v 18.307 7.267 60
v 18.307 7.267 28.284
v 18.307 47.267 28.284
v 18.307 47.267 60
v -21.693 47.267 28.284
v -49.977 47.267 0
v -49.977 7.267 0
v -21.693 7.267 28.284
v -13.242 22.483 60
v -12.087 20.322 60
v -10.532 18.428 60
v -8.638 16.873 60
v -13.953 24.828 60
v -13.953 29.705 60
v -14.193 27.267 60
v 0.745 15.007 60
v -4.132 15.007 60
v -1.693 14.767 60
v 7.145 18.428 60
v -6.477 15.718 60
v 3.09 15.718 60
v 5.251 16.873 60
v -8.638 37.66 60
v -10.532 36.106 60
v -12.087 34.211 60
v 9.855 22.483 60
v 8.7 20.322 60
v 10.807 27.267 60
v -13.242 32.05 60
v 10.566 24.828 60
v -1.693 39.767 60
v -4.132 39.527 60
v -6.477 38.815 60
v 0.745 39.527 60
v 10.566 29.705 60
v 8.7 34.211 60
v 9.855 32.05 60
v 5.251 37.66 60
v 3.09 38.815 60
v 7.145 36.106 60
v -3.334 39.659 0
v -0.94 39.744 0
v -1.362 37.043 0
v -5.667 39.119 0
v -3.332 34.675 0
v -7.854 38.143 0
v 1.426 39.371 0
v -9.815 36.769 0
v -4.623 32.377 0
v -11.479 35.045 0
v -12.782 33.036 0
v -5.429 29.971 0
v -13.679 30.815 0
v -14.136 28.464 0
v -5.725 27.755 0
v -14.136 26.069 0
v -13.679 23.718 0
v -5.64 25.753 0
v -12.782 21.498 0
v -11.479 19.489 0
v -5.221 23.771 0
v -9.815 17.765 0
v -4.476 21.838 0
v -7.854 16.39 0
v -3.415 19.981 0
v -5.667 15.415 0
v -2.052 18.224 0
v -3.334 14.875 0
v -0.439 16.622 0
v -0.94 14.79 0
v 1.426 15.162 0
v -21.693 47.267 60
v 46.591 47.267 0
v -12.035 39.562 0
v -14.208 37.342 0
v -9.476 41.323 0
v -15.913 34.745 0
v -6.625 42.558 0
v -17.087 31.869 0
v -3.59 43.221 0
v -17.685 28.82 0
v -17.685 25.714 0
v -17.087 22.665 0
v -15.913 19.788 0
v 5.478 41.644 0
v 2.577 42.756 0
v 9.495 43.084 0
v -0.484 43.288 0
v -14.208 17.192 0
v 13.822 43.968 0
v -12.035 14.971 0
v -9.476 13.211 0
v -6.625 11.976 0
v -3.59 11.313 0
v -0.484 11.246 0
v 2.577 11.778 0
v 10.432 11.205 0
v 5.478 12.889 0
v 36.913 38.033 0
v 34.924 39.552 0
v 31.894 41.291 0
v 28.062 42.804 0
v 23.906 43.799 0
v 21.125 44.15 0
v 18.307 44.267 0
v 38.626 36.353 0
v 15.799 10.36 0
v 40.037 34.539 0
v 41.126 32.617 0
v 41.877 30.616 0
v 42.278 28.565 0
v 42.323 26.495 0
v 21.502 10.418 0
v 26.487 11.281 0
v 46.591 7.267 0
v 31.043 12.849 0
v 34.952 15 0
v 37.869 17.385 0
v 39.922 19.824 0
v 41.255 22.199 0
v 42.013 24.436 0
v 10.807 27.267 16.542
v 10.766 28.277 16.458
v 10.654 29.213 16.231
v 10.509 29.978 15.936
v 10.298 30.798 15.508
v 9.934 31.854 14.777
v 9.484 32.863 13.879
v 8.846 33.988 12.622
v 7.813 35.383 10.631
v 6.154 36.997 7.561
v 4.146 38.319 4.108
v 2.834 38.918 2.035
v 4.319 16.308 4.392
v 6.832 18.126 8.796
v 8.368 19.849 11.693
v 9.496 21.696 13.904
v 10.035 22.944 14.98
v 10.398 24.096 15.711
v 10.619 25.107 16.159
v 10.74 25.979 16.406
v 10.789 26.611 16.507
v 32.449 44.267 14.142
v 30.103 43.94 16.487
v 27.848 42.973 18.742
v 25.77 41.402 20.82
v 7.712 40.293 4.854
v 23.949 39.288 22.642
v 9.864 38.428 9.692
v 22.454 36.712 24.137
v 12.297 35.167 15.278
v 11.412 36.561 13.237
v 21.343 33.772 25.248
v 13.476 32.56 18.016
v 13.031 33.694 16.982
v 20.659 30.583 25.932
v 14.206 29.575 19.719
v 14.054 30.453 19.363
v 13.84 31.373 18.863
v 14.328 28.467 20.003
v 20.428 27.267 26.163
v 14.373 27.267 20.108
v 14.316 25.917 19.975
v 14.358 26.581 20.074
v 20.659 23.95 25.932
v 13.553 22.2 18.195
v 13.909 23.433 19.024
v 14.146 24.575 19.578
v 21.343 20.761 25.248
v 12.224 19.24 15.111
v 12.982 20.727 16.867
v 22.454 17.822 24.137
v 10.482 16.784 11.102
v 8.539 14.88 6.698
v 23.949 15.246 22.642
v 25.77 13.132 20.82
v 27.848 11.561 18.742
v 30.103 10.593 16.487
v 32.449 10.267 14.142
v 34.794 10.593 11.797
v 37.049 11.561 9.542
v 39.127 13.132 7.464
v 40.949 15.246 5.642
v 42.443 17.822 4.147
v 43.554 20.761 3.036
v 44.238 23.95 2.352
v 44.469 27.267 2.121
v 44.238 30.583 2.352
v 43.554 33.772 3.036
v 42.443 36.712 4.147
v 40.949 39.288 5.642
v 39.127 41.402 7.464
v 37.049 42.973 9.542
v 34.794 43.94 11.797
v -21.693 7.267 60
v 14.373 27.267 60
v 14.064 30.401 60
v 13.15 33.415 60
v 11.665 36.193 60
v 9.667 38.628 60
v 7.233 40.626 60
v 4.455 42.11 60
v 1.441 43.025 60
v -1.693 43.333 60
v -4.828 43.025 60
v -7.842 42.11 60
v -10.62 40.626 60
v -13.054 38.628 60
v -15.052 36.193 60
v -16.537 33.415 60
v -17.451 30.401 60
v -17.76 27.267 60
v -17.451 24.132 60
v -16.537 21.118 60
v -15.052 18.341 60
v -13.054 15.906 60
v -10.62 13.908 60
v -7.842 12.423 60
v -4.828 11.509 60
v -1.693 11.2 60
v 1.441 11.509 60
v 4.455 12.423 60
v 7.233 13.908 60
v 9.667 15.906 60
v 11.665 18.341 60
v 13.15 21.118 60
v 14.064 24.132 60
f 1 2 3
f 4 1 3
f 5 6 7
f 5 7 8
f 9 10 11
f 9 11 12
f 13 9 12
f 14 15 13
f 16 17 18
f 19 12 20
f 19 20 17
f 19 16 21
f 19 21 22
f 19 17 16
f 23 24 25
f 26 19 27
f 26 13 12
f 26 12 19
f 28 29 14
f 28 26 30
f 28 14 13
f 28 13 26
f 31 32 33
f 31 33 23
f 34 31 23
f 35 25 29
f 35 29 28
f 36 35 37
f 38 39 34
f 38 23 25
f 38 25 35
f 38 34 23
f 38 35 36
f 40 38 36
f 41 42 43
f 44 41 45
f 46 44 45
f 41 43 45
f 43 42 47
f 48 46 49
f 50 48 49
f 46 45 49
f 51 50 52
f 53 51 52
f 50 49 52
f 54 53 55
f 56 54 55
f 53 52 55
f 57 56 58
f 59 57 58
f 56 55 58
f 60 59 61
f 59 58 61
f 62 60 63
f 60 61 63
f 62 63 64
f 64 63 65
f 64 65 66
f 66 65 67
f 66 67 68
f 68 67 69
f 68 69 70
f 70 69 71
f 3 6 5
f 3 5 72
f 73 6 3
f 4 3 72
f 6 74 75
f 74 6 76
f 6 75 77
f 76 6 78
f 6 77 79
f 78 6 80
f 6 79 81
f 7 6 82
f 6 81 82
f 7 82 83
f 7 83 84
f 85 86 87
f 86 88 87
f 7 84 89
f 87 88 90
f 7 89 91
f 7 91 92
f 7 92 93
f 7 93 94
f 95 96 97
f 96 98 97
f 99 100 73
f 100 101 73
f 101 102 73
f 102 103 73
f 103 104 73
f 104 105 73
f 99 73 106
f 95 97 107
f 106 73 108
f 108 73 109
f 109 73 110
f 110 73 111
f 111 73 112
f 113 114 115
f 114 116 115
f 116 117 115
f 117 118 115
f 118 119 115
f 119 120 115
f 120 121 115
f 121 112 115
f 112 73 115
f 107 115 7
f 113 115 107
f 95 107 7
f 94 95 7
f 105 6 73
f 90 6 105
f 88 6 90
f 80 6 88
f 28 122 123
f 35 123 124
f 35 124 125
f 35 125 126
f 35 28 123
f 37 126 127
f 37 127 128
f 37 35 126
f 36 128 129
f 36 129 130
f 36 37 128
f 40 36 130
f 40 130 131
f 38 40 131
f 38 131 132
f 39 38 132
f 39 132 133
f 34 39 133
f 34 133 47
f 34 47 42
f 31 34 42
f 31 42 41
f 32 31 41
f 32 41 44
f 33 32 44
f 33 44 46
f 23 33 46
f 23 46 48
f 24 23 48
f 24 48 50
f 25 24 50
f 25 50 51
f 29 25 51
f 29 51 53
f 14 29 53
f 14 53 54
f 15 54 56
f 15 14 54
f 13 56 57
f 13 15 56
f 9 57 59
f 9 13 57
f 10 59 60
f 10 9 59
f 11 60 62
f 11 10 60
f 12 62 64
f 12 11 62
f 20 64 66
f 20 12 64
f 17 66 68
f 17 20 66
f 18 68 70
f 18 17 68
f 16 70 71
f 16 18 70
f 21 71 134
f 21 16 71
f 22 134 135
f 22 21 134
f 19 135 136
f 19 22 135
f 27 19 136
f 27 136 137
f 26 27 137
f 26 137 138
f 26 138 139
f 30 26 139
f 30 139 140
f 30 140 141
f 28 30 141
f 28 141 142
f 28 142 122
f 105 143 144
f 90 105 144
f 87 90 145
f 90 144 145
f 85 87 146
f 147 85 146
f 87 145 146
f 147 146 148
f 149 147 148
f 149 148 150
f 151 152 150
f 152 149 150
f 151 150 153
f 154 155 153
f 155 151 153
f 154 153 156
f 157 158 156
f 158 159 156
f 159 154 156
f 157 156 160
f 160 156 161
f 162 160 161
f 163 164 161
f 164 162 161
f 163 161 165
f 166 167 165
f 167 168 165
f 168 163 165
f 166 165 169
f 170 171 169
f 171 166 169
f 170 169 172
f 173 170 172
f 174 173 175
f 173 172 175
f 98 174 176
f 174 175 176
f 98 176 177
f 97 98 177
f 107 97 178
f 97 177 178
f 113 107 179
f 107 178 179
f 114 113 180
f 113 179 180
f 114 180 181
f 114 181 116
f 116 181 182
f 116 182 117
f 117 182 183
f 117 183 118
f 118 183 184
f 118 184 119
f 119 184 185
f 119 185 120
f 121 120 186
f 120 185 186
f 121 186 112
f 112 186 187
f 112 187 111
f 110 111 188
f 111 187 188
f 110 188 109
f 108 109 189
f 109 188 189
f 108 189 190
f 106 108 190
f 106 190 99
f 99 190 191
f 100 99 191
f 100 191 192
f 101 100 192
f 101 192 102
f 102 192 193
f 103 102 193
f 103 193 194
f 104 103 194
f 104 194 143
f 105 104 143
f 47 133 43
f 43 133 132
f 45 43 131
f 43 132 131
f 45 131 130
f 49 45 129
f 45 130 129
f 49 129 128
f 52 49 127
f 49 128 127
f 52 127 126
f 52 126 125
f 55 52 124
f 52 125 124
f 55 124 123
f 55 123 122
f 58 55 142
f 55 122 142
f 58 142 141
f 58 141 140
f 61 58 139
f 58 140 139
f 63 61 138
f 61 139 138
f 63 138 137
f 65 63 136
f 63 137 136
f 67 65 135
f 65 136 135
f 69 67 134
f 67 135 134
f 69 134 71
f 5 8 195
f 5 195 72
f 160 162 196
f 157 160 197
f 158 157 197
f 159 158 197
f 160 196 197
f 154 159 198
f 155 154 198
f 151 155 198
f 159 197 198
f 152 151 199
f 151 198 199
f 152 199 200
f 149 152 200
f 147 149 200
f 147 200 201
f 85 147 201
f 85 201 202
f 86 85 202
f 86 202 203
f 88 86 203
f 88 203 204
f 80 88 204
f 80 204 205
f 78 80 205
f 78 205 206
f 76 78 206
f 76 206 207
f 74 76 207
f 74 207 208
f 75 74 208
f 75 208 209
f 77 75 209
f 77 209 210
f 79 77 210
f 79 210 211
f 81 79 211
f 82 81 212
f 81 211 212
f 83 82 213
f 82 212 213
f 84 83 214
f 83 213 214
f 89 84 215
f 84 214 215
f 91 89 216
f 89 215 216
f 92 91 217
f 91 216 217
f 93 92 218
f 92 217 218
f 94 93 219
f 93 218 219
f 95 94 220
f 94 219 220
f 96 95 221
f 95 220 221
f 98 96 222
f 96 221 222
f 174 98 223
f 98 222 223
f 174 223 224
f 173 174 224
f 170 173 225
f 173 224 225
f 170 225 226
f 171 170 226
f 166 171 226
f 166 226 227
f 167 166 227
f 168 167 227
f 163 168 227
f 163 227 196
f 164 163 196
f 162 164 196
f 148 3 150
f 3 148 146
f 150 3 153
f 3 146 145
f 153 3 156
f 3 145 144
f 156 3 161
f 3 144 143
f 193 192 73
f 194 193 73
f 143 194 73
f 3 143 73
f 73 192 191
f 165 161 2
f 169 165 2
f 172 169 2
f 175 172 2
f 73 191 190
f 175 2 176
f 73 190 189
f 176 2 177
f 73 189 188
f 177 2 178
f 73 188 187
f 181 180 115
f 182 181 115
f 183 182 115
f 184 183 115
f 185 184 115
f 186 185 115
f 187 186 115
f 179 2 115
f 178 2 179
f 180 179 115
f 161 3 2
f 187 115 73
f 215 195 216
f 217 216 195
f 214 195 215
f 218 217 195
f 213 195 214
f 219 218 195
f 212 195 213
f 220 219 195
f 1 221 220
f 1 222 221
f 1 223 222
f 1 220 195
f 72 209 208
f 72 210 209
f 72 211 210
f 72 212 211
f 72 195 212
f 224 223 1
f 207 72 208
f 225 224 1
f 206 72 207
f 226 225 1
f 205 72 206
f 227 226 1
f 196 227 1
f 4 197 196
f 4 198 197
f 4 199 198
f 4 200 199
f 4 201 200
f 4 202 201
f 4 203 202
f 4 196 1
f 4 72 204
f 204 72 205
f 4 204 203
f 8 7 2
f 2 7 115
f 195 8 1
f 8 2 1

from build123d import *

# Parameters (mm, degrees)
F0_W      = 40
F0_H      = 40
F1_DEPTH  = 60
F2_W      = 40
F2_H      = 28.284
F3_DEPTH  = 28.284
F4_W      = 40
F4_H      = 28.284
F5_DEPTH  = 28.284
F7_DEPTH  = 40.001
F8_R      = 16.066492
F8_R_2    = 12.5
F9_DEPTH  = 60.001
F10_R     = 17
F11_DEPTH = 68.284888


with BuildPart() as f1:
    # F0 (on Top) → F1 (new body)
    with BuildSketch(Plane.XY):
        with Locations((-1.693472, 27.266839)):
            Rectangle(F0_W, F0_H)
    extrude(amount=F1_DEPTH)

    # F2 (on face) → F3 (join)
    with BuildSketch(Plane.YZ.offset(18.306528)):
        with Locations((27.266839, 14.142)):
            Rectangle(F2_W, F2_H)
    extrude(amount=F3_DEPTH)

    # F4 (on face) → F5 (join)
    with BuildSketch(Plane(origin=(-21.693472, 0, 0), x_dir=(0, -1, 0), z_dir=(-1, 0, 0))):
        with Locations((-27.266839, 14.142)):
            Rectangle(F4_W, F4_H)
    extrude(amount=F5_DEPTH)

    # F6 (on face) → F7 (cut, through all)
    with BuildSketch(Plane.XZ.offset(-7.266839)):
        Polygon((-49.977472, 0), (-21.693472, 28.284), (-49.977472, 28.284), align=None)
        Polygon((18.306528, 28.284), (46.590528, 0), (46.590528, 28.284), align=None)
    extrude(amount=-F7_DEPTH, mode=Mode.SUBTRACT)

    # F8 (on face) → F9 (cut, through all)
    with BuildSketch(Plane.XY.offset(60)):
        with Locations((-1.693472, 27.266839)):
            Circle(F8_R)
        with Locations((-1.693472, 27.266839)):
            Circle(F8_R_2, mode=Mode.SUBTRACT)
    extrude(amount=-F9_DEPTH, mode=Mode.SUBTRACT)

    # F10 (on face) → F11 (cut, through all)
    with BuildSketch(Plane(origin=(23.295264, 0, 23.295264), x_dir=(0, 1, 0), z_dir=(0.707107, 0, 0.707107))):
        with Locations((27.266839, -12.94467)):
            Circle(F10_R)
    extrude(amount=-F11_DEPTH, mode=Mode.SUBTRACT)


solid = f1.part
